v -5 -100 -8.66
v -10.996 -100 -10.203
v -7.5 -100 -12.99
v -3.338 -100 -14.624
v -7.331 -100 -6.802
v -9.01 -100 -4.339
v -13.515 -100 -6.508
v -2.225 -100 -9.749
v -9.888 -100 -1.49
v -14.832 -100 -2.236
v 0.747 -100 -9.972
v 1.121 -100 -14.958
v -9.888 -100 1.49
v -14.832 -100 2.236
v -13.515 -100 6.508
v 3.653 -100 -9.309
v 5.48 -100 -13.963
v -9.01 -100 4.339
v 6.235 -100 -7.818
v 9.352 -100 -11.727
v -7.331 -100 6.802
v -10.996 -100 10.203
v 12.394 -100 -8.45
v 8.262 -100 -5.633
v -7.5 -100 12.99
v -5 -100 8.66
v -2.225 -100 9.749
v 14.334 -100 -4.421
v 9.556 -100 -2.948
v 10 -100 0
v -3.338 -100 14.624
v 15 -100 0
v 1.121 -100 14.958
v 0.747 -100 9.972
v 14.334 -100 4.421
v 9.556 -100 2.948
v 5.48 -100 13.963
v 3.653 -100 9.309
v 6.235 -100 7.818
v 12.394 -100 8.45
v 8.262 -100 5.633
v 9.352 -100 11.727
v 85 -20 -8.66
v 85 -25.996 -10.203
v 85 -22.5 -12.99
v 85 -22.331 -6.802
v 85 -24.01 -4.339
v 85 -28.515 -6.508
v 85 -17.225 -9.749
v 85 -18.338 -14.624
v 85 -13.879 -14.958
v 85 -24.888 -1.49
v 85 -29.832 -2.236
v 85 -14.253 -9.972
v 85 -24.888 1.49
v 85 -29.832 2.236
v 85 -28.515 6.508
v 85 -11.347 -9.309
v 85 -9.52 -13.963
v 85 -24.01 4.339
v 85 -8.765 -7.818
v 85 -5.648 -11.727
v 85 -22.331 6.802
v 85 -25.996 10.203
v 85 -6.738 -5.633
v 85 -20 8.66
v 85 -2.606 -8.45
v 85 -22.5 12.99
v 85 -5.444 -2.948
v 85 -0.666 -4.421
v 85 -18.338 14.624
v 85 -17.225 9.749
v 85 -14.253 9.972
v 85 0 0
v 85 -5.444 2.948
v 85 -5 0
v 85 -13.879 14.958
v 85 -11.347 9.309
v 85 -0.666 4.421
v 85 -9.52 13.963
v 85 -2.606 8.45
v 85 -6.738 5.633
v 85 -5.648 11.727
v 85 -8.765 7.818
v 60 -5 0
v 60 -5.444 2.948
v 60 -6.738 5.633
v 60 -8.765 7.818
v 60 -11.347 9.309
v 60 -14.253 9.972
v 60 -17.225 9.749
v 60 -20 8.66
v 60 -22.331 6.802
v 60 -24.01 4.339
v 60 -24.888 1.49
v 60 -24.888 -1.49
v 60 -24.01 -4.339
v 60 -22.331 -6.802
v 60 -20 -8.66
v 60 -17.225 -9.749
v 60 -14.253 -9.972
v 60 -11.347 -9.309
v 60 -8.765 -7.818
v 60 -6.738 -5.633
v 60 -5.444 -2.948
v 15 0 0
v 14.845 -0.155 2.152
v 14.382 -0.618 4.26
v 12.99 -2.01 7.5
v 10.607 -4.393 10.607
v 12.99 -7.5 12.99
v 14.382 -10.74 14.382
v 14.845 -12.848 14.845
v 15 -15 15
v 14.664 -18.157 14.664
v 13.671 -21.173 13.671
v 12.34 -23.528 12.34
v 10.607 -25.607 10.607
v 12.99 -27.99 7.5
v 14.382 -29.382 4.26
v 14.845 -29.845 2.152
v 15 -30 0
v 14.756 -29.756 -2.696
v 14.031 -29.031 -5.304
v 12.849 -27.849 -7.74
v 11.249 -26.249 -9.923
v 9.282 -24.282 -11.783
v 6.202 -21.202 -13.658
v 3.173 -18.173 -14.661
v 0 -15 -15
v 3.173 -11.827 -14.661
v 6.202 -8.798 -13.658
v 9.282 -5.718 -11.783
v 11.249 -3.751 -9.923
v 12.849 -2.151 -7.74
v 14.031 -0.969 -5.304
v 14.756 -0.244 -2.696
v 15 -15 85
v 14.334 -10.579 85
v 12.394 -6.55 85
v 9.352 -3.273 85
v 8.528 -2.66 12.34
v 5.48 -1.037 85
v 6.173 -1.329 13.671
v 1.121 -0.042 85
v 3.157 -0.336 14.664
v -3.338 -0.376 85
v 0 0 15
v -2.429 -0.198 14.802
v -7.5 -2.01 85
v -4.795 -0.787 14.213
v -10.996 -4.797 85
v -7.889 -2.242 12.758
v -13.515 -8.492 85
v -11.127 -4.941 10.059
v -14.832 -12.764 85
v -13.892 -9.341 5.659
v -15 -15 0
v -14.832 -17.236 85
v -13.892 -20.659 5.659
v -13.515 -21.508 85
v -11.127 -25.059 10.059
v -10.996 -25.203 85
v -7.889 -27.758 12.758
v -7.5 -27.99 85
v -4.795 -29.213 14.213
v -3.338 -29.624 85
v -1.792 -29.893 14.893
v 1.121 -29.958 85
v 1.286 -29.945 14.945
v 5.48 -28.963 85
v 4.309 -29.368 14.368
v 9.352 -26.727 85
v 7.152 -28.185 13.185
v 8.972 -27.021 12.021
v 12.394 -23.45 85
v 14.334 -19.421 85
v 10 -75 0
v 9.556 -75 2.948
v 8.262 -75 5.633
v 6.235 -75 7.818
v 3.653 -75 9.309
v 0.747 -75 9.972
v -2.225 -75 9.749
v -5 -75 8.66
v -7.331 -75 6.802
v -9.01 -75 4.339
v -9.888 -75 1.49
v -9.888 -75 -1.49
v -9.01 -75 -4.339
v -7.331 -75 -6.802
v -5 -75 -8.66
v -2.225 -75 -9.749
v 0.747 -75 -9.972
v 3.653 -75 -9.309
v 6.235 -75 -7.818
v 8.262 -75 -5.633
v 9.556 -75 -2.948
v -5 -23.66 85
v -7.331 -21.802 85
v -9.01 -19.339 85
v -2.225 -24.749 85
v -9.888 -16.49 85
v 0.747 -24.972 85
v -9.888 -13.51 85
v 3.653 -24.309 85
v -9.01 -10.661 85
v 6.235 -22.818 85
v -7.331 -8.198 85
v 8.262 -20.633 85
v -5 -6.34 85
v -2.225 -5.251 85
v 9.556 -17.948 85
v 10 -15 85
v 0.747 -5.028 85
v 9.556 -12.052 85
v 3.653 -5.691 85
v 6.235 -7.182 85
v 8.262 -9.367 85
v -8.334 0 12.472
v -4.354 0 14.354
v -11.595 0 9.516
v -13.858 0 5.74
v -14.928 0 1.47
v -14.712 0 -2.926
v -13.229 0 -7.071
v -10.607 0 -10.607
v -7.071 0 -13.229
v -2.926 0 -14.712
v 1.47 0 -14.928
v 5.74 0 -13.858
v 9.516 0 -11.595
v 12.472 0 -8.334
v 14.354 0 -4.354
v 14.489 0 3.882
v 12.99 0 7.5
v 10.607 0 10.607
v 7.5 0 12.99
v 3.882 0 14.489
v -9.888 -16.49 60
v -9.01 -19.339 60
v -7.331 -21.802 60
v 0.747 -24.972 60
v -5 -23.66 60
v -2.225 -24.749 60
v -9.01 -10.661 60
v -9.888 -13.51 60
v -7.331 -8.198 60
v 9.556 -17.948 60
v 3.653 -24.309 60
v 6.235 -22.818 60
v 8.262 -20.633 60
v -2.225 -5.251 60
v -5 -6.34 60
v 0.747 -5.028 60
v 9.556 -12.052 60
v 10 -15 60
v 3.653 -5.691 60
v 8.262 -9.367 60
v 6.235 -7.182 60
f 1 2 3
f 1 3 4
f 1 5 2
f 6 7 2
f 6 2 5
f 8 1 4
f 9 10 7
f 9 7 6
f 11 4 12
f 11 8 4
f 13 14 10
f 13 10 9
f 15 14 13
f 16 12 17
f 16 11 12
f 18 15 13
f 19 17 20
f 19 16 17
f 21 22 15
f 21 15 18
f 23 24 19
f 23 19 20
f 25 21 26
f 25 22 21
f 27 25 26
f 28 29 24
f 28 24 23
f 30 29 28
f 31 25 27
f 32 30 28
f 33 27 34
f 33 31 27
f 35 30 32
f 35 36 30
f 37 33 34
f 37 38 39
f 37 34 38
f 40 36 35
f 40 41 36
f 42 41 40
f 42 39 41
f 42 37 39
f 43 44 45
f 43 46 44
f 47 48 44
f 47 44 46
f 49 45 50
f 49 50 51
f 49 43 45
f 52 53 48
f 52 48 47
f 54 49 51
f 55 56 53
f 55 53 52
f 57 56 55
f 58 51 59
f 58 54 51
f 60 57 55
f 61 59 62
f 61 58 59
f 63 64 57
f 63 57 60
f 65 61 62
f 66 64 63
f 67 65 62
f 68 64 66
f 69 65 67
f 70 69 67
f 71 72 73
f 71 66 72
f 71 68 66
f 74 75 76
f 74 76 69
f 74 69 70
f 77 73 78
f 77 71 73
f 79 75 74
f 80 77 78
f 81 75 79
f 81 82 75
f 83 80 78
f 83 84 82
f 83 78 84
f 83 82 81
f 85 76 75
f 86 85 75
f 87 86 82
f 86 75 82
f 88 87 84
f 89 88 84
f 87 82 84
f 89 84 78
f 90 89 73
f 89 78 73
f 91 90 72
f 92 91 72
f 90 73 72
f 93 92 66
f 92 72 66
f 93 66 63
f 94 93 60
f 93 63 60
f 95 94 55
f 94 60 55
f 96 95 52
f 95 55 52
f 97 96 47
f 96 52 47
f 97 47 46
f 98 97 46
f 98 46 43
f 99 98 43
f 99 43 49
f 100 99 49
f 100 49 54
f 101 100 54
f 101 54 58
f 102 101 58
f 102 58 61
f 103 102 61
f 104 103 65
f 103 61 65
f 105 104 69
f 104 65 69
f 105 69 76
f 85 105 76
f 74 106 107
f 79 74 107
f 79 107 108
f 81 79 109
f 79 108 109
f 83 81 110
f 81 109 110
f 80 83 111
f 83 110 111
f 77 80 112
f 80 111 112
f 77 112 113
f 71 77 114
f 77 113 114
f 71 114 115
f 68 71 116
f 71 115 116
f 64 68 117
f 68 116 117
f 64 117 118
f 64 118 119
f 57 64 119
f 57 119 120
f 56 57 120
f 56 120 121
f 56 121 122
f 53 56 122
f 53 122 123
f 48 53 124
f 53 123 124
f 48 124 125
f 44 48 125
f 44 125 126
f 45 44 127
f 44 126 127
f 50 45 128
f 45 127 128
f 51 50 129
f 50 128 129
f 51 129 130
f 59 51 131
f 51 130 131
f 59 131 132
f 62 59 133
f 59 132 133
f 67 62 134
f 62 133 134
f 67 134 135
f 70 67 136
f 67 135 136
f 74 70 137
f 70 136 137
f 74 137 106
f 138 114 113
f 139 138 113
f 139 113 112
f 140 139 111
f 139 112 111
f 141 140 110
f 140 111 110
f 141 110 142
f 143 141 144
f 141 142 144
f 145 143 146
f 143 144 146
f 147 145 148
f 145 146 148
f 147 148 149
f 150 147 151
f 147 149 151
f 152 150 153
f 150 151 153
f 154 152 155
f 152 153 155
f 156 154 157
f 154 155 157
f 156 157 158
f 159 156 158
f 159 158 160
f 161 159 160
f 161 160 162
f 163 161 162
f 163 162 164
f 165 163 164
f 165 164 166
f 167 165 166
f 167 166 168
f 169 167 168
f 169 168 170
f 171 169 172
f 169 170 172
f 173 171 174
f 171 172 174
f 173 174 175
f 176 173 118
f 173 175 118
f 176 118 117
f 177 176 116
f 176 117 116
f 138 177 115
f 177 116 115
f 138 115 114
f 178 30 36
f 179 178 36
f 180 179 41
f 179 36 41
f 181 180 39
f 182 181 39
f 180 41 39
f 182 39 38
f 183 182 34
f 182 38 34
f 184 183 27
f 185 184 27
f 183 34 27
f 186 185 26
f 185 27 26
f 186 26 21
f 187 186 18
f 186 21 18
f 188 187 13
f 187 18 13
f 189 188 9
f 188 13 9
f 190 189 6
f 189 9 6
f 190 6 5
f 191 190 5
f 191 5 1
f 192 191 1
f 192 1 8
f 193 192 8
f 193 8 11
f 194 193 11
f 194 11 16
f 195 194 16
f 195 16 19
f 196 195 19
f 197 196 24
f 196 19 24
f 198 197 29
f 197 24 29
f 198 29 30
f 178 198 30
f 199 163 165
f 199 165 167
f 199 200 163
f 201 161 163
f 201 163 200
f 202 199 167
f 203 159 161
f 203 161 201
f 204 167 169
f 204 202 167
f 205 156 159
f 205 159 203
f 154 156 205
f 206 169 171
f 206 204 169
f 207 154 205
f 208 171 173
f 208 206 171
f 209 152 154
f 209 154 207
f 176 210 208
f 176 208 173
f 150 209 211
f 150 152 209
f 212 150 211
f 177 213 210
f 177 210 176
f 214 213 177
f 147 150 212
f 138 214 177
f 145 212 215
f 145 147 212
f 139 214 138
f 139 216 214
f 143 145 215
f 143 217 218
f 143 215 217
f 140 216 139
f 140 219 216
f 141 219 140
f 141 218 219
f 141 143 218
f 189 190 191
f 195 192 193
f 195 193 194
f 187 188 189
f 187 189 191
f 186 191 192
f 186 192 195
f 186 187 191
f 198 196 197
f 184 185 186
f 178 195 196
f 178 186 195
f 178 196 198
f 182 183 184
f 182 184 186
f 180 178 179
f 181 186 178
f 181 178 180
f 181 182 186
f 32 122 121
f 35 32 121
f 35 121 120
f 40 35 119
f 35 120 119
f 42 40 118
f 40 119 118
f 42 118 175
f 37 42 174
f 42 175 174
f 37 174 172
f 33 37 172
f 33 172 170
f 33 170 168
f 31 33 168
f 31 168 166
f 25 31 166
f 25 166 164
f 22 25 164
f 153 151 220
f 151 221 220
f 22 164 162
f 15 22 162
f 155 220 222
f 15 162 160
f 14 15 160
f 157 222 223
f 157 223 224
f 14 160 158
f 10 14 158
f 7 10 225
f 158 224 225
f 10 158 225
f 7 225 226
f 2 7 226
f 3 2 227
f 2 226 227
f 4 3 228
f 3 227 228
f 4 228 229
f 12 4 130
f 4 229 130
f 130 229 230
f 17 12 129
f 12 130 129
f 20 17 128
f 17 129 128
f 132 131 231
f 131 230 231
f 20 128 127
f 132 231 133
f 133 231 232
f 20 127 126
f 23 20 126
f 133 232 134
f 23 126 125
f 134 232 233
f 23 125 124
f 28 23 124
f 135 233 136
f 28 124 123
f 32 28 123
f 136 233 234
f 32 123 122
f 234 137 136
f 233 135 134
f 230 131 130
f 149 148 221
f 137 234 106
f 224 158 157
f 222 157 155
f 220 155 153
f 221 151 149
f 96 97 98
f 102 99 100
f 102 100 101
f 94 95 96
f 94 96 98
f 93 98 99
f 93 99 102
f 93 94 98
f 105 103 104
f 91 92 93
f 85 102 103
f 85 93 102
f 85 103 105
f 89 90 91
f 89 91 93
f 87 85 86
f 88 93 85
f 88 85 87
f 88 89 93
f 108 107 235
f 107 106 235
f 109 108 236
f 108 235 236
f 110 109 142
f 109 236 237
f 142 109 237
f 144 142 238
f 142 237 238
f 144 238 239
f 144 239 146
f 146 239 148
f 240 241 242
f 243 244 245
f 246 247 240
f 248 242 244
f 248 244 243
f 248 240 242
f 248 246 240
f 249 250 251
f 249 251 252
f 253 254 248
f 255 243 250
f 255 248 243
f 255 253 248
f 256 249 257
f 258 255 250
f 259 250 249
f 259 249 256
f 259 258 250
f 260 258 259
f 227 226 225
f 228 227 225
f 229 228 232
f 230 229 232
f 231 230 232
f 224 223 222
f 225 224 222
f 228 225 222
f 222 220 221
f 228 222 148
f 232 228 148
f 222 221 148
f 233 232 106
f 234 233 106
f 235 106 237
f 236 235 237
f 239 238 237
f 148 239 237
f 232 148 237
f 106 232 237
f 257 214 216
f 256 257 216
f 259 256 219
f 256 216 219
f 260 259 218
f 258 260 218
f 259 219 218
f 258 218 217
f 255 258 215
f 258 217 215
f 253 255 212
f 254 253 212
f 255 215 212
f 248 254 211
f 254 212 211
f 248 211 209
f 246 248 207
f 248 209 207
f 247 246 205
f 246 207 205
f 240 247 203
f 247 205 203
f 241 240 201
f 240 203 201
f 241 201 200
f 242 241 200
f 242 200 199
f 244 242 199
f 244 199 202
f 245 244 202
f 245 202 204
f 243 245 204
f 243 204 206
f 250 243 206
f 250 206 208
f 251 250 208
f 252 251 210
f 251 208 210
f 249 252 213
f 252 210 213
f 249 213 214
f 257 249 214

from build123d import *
from build123d import SkipClean  # not in build123d's __all__

# Parameters (mm, degrees)
F2_R      = 15
F3_DEPTH  = 100
F4_R      = 10
F5_DEPTH  = 25
F6_R      = 15
F7_DEPTH  = 85
F8_R      = 10
F9_DEPTH  = 25
F10_R     = 15
F11_DEPTH = 85
F12_R     = 10
F13_DEPTH = 25


with BuildPart() as f3:
    # F2 (on Front) → F3 (new body)
    with BuildSketch(Plane.XZ):
        Circle(F2_R)
    extrude(amount=F3_DEPTH)

    # F4 (on face) → F5 (cut)
    with BuildSketch(Plane.XZ.offset(100)):
        Circle(F4_R)
    extrude(amount=-F5_DEPTH, mode=Mode.SUBTRACT)

    # F6 (on Top) → F7 (join)
    with BuildSketch(Plane.XY):
        with Locations((0, -15)):
            Circle(F6_R)
    with SkipClean():  # cleaning this boolean's faces spoils the solid; the shape is the same uncleaned
        extrude(amount=F7_DEPTH)

    # F8 (on face) → F9 (cut)
    with BuildSketch(Plane.XY.offset(85)):
        with Locations((0, -15)):
            Circle(F8_R)
    with SkipClean():  # cleaning this boolean's faces spoils the solid; the shape is the same uncleaned
        extrude(amount=-F9_DEPTH, mode=Mode.SUBTRACT)

    # F10 (on Right) → F11 (join)
    with BuildSketch(Plane.YZ):
        with Locations((-15, 0)):
            Circle(F10_R)
    extrude(amount=F11_DEPTH)

    # F12 (on face) → F13 (cut)
    with BuildSketch(Plane.YZ.offset(85)):
        with Locations((-15, 0)):
            Circle(F12_R)
    extrude(amount=-F13_DEPTH, mode=Mode.SUBTRACT)


solid = f3.part
